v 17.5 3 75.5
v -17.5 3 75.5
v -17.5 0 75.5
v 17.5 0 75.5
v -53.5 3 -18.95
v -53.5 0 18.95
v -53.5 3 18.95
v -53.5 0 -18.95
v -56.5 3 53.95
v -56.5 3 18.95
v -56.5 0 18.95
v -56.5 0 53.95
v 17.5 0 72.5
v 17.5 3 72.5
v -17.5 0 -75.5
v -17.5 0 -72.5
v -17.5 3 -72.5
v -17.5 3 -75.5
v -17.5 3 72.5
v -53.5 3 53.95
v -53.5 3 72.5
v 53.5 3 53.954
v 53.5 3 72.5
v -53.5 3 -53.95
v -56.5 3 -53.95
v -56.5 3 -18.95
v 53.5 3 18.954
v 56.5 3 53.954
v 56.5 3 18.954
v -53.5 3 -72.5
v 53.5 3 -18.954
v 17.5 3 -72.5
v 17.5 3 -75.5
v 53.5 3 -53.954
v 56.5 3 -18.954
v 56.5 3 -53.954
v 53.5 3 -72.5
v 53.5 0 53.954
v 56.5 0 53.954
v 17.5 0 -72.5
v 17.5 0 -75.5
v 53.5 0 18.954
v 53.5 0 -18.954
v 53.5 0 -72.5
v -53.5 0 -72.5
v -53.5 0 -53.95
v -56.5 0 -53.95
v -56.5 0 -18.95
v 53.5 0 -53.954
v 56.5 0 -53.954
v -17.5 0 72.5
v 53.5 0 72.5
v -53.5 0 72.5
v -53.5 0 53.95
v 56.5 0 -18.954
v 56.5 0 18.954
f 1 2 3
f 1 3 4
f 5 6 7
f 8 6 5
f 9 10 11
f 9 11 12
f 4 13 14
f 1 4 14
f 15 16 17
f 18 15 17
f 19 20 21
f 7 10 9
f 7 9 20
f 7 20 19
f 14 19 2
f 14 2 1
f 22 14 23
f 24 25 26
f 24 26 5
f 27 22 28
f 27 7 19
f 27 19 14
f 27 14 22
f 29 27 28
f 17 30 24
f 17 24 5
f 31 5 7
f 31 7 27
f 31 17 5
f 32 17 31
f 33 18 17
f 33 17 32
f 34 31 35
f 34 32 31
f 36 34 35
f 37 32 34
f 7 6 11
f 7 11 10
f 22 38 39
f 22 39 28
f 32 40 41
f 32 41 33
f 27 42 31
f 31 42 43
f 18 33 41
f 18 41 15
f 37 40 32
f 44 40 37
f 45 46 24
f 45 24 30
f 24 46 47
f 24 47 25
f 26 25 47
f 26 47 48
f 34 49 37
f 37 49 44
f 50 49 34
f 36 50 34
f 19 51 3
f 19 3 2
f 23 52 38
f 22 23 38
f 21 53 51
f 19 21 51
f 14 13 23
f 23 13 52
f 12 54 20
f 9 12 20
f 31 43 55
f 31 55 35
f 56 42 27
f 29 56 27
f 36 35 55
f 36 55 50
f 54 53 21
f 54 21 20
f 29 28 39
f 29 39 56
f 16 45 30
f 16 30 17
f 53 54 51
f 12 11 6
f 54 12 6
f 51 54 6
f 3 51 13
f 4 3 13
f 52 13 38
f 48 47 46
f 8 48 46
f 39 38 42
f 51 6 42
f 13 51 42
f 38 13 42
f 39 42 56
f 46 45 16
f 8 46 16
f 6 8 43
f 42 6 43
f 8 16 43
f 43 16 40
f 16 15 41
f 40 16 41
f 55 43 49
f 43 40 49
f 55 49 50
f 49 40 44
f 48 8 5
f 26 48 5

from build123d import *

# Parameters (mm, degrees)
SKETCH1_W           = 107
SKETCH1_H           = 145
BOSS_EXTRUDE1_DEPTH = 3
SKETCH3_W           = 35
SKETCH3_H           = 3
BOSS_EXTRUDE4_DEPTH = 3
SKETCH4_W           = 35
SKETCH4_H           = 3
BOSS_EXTRUDE5_DEPTH = 3
SKETCH5_W           = 35
SKETCH5_H           = 3
BOSS_EXTRUDE6_DEPTH = 3
SKETCH6_W           = 35
SKETCH6_H           = 3
BOSS_EXTRUDE7_DEPTH = 3


with BuildPart() as part:
    # Sketch1 → Boss-Extrude1 (new body)
    with BuildSketch(Plane(origin=(0, 0, 0), x_dir=(1, 0, 0), z_dir=(0, 1, 0))):
        Rectangle(SKETCH1_W, SKETCH1_H)
    extrude(amount=BOSS_EXTRUDE1_DEPTH)

    # Sketch3 → Boss-Extrude4 (add)
    with BuildSketch(Plane(origin=(53.5, 0, 0), x_dir=(0, 0, -1), z_dir=(1, 0, 0))):
        with Locations((36.453510912, 1.5)):
            Rectangle(SKETCH3_W, SKETCH3_H)
        with Locations((-36.453510912, 1.5)):
            Rectangle(SKETCH3_W, SKETCH3_H)
    extrude(amount=BOSS_EXTRUDE4_DEPTH)

    # Sketch4 → Boss-Extrude5 (add)
    with BuildSketch(Plane.ZY.offset(53.5)):
        with Locations((-36.45, 1.5)):
            Rectangle(SKETCH4_W, SKETCH4_H)
        with Locations((36.45, 1.5)):
            Rectangle(SKETCH4_W, SKETCH4_H)
    extrude(amount=BOSS_EXTRUDE5_DEPTH)

    # Sketch5 → Boss-Extrude6 (add)
    with BuildSketch(Plane.XY.offset(72.5)):
        with Locations((0, 1.5)):
            Rectangle(SKETCH5_W, SKETCH5_H)
    extrude(amount=BOSS_EXTRUDE6_DEPTH)

    # Sketch6 → Boss-Extrude7 (add)
    with BuildSketch(Plane(origin=(0, 0, -72.5), x_dir=(-1, 0, 0), z_dir=(0, 0, -1))):
        with Locations((0, 1.5)):
            Rectangle(SKETCH6_W, SKETCH6_H)
    extrude(amount=BOSS_EXTRUDE7_DEPTH)


solid = part.part
